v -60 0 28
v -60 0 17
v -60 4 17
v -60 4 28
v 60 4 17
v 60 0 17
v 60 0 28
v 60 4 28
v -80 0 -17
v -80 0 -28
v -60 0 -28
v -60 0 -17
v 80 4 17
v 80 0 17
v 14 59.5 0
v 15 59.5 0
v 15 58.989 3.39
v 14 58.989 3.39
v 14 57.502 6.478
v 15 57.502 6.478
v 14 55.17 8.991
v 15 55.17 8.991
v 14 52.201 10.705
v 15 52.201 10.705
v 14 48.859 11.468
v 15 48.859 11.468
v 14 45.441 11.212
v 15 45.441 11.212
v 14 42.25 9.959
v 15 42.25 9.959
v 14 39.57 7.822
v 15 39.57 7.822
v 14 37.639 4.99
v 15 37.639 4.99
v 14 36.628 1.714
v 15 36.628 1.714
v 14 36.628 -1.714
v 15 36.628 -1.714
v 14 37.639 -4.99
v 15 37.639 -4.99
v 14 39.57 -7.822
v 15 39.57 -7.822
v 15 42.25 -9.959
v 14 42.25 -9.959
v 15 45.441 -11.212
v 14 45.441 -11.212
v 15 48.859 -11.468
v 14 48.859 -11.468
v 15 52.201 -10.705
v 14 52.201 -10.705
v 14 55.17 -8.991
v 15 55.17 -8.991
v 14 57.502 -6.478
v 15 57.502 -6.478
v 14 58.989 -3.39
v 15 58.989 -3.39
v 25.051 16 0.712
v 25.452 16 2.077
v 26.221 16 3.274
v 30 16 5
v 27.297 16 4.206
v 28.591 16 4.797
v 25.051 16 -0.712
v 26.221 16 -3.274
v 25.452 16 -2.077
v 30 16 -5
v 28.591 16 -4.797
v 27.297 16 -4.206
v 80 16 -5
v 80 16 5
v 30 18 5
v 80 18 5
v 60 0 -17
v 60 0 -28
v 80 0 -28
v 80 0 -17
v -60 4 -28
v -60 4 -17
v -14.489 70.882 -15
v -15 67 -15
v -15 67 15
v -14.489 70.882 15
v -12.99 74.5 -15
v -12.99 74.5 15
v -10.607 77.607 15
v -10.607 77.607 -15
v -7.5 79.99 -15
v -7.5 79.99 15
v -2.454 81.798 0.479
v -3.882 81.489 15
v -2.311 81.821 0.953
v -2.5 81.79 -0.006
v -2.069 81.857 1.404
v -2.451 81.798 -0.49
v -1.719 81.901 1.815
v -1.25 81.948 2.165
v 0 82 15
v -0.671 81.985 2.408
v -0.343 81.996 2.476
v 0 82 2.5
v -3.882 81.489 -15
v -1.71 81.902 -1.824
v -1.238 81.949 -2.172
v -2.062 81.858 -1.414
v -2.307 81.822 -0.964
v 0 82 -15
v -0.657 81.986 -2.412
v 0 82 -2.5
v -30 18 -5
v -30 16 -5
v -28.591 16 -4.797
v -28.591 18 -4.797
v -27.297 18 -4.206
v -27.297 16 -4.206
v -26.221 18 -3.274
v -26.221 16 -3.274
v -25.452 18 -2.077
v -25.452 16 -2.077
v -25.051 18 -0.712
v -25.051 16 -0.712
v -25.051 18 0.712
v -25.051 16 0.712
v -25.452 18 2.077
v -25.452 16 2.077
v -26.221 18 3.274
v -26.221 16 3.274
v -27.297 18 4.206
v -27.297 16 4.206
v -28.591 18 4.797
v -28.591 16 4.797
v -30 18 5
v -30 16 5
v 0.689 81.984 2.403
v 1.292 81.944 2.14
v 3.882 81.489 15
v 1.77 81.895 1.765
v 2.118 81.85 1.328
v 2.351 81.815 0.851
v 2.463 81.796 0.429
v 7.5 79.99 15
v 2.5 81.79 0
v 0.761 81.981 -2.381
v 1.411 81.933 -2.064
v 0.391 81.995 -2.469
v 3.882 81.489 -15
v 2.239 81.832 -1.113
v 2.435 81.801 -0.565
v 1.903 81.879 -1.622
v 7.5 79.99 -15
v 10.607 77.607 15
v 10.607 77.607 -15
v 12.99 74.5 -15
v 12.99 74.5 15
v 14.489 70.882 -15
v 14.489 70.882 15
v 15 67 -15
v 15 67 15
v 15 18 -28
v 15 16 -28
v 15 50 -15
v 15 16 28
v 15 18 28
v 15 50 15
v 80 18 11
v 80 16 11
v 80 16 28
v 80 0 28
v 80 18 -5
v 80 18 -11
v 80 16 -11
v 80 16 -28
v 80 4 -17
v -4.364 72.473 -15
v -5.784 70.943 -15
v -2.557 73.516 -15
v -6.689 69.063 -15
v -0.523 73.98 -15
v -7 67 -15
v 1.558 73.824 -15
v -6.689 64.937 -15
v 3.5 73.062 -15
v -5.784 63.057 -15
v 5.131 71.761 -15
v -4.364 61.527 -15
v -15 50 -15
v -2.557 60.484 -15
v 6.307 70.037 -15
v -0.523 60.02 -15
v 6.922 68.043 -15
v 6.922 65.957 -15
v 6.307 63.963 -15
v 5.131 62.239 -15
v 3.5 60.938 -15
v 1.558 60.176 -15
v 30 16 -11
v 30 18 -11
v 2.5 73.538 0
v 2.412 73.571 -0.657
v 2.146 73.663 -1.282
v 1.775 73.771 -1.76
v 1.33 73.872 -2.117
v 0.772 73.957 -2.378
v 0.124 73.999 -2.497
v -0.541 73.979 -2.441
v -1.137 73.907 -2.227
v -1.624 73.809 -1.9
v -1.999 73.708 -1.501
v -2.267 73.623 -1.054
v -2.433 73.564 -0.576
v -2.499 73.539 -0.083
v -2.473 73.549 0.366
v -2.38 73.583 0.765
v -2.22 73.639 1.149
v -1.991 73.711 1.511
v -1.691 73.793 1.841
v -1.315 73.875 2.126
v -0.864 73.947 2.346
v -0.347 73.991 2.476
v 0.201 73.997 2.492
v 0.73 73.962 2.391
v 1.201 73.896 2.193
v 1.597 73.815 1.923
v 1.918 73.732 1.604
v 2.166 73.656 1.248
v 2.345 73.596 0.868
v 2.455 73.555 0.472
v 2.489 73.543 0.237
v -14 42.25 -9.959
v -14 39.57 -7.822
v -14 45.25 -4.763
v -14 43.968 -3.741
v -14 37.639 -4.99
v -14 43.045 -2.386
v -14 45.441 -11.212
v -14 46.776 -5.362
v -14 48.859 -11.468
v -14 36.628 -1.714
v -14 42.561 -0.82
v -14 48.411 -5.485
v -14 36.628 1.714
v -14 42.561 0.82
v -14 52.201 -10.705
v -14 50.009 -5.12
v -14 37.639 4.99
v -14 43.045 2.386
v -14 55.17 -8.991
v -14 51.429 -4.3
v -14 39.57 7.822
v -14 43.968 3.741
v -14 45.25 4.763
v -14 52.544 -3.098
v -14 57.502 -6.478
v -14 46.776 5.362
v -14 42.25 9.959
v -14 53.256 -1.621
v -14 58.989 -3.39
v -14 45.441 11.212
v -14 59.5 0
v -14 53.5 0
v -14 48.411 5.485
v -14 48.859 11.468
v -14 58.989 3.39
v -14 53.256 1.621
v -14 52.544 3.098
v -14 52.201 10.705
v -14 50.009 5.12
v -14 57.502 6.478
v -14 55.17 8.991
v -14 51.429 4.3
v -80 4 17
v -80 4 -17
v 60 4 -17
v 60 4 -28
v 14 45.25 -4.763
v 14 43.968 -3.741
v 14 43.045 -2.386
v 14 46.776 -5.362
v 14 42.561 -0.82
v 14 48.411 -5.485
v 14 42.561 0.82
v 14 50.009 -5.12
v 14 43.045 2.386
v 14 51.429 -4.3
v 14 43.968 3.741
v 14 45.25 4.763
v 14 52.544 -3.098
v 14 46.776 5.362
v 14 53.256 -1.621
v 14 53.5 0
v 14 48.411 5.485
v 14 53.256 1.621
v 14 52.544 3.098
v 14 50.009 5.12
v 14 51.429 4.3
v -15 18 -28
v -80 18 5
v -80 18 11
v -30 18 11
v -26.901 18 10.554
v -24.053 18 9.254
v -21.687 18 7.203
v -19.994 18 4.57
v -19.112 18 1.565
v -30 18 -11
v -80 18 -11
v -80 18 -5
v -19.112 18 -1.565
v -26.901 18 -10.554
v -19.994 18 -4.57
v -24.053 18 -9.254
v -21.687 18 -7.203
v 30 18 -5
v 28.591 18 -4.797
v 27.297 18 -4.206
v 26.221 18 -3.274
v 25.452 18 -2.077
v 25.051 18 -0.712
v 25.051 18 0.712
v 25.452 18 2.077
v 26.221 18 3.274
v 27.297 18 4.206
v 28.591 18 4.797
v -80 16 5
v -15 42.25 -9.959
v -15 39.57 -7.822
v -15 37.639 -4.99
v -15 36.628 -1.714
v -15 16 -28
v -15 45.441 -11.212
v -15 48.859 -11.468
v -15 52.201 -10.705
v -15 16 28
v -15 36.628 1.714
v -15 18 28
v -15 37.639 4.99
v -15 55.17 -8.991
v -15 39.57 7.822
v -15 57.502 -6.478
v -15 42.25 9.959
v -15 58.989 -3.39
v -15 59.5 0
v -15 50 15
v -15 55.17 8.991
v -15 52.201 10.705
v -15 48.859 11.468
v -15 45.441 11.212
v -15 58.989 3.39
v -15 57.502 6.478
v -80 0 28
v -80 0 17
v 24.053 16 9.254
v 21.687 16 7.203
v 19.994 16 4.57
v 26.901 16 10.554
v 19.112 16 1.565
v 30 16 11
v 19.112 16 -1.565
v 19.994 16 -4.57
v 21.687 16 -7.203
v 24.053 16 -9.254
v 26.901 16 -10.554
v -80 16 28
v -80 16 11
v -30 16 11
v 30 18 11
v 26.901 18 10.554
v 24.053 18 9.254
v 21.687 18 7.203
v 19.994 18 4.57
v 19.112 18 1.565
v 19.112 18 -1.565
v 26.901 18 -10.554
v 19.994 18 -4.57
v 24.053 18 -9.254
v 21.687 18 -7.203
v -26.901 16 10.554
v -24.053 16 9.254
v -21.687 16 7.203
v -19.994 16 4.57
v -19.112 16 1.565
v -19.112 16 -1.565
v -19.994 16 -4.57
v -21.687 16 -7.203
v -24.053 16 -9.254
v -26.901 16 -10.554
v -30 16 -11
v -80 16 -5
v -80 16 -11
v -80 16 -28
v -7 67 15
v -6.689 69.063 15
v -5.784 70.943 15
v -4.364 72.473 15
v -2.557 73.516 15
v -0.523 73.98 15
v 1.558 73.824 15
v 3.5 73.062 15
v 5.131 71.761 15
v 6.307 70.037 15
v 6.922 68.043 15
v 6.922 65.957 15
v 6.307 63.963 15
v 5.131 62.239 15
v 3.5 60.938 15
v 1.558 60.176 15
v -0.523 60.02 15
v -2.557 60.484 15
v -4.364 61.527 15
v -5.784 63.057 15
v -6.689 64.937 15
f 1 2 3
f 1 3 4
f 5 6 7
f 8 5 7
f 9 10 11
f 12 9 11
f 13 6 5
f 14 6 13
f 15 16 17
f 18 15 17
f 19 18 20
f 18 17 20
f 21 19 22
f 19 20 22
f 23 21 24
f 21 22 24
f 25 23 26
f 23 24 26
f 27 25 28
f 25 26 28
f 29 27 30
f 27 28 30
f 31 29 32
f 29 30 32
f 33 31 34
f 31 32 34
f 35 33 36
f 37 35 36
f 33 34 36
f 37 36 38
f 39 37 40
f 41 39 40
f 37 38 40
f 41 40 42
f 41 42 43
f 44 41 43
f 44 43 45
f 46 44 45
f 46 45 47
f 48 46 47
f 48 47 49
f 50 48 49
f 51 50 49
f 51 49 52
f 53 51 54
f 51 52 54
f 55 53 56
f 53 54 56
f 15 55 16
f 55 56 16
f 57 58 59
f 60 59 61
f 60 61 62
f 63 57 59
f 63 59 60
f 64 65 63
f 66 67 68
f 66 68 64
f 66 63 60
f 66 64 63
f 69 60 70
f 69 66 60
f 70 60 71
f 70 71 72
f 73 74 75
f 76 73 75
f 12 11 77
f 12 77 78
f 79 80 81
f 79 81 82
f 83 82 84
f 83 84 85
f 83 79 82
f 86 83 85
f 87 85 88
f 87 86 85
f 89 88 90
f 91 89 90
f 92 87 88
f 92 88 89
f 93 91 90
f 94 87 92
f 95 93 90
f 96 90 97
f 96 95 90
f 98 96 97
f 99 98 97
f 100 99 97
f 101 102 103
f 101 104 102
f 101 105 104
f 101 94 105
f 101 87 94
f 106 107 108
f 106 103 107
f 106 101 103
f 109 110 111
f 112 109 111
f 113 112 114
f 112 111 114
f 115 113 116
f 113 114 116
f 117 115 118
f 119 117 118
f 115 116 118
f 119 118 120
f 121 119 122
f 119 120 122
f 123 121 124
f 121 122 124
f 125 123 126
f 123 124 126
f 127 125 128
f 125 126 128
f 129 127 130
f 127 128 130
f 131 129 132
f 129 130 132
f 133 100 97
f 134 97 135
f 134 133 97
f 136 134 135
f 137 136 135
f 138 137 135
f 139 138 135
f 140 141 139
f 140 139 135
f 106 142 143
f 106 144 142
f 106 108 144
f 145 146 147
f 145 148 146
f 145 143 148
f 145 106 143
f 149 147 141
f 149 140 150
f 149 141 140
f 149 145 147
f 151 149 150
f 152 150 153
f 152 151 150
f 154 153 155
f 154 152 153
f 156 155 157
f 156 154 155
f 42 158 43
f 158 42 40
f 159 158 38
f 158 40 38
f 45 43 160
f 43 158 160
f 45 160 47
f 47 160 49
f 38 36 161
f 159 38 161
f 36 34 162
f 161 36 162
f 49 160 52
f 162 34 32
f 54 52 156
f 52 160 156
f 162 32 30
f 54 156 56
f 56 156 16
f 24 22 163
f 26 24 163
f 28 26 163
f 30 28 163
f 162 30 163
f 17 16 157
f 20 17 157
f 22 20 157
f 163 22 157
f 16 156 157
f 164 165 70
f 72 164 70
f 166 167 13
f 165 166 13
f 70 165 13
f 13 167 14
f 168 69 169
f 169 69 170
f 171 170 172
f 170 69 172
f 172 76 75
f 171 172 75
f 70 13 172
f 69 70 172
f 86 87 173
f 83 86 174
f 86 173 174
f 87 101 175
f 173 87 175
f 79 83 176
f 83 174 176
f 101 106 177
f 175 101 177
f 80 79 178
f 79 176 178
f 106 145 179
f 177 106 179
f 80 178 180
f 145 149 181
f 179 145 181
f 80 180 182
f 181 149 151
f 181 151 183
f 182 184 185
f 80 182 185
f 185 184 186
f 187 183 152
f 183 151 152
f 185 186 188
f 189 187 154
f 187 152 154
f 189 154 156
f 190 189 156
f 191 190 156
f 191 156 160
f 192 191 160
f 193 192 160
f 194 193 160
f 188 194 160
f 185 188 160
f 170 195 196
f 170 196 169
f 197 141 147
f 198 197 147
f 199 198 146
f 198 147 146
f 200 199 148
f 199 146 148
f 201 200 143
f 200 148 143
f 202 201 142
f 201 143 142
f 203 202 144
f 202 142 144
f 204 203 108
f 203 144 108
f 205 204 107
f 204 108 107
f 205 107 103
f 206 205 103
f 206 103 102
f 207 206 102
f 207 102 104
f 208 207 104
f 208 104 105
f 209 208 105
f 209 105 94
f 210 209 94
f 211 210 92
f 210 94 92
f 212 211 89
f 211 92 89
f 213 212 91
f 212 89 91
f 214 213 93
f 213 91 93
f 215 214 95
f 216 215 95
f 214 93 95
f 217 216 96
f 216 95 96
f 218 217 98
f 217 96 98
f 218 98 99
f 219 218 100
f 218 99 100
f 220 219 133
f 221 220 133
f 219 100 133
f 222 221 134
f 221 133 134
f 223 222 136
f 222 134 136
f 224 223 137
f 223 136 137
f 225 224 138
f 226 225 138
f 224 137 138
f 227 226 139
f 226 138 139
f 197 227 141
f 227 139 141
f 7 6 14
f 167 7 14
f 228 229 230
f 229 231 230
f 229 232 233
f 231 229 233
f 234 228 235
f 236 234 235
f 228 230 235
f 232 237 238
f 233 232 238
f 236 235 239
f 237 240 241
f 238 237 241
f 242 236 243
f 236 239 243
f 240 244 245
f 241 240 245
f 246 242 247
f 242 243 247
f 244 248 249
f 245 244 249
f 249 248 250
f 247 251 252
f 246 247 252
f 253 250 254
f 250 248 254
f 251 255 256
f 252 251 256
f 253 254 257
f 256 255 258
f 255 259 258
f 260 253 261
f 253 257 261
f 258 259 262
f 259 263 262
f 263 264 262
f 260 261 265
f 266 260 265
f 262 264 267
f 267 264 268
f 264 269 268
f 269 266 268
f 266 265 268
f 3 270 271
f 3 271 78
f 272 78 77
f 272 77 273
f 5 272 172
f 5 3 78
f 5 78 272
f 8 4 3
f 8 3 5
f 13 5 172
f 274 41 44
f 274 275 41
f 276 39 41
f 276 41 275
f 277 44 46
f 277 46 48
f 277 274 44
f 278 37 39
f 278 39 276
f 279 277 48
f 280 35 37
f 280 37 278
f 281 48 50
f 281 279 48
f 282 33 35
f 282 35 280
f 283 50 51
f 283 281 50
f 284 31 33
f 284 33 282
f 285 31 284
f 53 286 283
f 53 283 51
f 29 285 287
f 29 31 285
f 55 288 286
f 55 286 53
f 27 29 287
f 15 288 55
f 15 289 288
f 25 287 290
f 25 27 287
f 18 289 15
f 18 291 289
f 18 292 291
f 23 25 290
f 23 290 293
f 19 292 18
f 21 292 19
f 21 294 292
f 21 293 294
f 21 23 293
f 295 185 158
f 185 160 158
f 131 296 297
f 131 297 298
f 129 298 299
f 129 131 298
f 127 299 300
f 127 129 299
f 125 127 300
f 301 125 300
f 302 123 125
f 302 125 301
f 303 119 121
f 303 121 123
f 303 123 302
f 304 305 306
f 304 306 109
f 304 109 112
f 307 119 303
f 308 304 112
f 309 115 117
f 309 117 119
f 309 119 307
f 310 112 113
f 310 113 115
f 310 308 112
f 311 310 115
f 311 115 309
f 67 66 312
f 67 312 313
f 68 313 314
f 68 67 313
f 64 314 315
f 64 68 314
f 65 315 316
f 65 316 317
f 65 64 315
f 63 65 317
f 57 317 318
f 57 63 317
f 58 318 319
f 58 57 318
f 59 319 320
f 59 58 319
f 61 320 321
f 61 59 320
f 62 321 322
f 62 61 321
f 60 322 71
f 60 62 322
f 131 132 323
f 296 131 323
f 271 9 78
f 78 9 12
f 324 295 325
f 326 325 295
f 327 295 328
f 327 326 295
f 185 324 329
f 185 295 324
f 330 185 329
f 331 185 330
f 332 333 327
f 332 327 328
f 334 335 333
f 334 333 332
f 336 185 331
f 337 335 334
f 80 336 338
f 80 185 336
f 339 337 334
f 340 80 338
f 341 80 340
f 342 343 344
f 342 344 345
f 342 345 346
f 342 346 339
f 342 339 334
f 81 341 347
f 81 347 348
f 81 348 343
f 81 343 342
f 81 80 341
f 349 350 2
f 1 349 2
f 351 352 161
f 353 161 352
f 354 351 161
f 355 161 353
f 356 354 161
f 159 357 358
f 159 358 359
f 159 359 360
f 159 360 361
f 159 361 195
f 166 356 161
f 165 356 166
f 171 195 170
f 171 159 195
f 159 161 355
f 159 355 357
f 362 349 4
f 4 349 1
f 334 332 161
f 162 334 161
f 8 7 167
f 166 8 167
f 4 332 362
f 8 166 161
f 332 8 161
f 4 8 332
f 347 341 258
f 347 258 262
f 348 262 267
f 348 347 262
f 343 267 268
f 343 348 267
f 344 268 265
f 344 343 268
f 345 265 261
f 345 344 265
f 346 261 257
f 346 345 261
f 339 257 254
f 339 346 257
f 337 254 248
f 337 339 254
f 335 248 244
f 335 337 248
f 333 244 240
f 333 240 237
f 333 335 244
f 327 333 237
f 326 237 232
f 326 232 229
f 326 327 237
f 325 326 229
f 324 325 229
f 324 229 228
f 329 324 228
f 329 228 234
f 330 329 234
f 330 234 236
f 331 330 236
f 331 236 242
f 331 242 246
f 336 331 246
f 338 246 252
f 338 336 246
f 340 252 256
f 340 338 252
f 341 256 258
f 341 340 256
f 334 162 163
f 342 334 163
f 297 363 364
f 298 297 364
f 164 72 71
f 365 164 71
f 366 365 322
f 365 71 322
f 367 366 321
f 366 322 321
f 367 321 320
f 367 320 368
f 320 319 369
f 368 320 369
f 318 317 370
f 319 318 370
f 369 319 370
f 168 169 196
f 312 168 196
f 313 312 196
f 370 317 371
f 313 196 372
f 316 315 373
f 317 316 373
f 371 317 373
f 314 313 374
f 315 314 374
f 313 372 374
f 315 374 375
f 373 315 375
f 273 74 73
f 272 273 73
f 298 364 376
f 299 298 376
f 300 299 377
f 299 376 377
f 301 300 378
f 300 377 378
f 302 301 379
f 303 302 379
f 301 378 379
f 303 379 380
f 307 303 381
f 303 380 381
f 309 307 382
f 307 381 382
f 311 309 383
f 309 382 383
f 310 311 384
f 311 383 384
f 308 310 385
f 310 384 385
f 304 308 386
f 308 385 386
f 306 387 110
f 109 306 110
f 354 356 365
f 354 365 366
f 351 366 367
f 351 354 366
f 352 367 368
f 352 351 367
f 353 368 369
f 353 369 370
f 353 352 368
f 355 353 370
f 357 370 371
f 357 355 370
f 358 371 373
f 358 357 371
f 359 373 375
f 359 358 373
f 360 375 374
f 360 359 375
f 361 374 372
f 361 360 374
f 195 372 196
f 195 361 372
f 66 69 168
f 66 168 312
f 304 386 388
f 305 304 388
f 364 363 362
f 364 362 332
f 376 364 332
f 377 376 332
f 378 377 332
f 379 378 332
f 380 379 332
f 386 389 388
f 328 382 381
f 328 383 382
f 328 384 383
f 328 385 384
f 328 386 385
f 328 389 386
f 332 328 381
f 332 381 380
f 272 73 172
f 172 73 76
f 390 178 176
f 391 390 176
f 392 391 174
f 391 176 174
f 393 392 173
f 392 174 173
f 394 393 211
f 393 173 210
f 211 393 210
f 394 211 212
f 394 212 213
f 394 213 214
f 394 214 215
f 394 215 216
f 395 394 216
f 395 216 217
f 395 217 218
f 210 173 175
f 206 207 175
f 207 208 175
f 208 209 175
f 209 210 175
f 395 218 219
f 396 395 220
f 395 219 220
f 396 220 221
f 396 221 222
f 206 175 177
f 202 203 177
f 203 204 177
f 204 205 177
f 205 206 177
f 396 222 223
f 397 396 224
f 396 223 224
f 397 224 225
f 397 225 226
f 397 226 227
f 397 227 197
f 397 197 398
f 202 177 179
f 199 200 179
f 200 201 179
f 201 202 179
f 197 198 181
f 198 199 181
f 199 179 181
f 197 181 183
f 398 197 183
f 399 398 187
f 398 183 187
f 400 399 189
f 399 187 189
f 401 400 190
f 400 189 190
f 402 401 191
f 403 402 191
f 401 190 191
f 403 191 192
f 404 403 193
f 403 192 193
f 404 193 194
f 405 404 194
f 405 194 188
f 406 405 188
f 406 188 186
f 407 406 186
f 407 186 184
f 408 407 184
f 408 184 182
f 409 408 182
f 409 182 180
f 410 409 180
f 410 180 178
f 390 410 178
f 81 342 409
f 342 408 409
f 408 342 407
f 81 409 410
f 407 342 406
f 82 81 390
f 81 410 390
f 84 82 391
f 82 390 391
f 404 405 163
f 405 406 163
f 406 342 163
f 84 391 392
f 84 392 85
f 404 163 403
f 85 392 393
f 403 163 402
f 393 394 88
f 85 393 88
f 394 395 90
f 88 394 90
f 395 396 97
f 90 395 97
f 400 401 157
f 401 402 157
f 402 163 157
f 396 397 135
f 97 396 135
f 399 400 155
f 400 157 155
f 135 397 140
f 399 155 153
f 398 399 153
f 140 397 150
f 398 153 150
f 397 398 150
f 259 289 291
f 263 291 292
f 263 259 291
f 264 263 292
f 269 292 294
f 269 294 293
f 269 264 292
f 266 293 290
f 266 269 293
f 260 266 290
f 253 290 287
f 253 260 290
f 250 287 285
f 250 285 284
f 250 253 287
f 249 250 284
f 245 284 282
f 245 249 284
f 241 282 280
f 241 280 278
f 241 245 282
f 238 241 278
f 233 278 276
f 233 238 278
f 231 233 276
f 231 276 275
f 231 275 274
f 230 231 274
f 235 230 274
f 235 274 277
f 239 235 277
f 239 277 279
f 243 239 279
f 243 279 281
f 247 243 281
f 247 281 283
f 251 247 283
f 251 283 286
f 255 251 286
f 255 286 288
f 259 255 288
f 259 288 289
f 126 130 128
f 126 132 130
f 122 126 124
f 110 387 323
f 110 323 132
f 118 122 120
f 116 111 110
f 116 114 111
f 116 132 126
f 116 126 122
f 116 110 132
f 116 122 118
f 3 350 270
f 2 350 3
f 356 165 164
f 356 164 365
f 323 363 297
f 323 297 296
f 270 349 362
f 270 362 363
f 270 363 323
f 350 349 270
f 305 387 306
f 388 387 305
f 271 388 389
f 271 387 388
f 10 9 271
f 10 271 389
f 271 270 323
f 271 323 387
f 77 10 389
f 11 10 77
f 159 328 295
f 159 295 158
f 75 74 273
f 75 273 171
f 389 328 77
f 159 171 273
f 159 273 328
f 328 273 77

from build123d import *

# Parameters (mm, degrees)
SKETCH_1_W                  = 160
SKETCH_1_H                  = 56
EXTRUDE_1_DEPTH             = 16
SKETCH_2_W                  = 160
SKETCH_2_H                  = 34
CUT_EXTRUDE_1_DEPTH         = 4
SKETCH_3_W                  = 120
SKETCH_3_H                  = 56
CUT_EXTRUDE_2_DEPTH         = 4
EXTRUDE_2_DEPTH             = 2
EXTRUDE_3_DEPTH             = 15
CUT_EXTRUDE_START           = -30
CUT_EXTRUDE_3_DEPTH         = 30
HOLE_WIZARD_M16_1_D         = 14
HOLE_WIZARD_M6_1_REACH      = 119.932
HOLE_WIZARD_M6_1_BORE_R     = 2.5
HOLE_START                  = -15
HOLE_WIZARD_1_OUTLINE_R     = 5.5
HOLE_WIZARD_1_DEPTH         = 15
HOLE_WIZARD_1_2_OUTLINE_R   = 11.5
HOLE_WIZARD_1_2_OUTLINE_R_2 = 5.5
HOLE_WIZARD_1_2_DEPTH       = 1


# Read off the part's stored shape, not the designer's step: 切除-拉伸3, 孔1
with BuildPart() as part:
    # 草图1 → 凸台-拉伸1 (new body)
    with BuildSketch(Plane(origin=(0, 0, 0), x_dir=(1, 0, 0), z_dir=(0, 1, 0))):
        Rectangle(SKETCH_1_W, SKETCH_1_H)
    extrude(amount=EXTRUDE_1_DEPTH)

    # 草图2 → 切除-拉伸1 (cut)
    with BuildSketch(Plane.XZ):
        Rectangle(SKETCH_2_W, SKETCH_2_H)
    extrude(amount=-CUT_EXTRUDE_1_DEPTH, mode=Mode.SUBTRACT)

    # 草图3 → 切除-拉伸2 (cut)
    with BuildSketch(Plane.XZ):
        Rectangle(SKETCH_3_W, SKETCH_3_H)
    extrude(amount=-CUT_EXTRUDE_2_DEPTH, mode=Mode.SUBTRACT)

    # 草图4 → 凸台-拉伸2 (add)
    with BuildSketch(Plane(origin=(0, 16, 0), x_dir=(1, 0, 0), z_dir=(0, 1, 0))):
        with BuildLine():
            Line((-30, 11), (-80, 11))
            Line((-80, 11), (-80, 5))
            Line((-80, 5), (-30, 5))
            ThreePointArc((-30, 5), (-25, 0), (-30, -5))
            Line((-30, -5), (-80, -5))
            Line((-80, -5), (-80, -11))
            Line((-80, -11), (-30, -11))
            ThreePointArc((-30, -11), (-19, 0), (-30, 11))
        make_face()
    extrude_2 = extrude(amount=EXTRUDE_2_DEPTH)

    # 镜向1: 凸台-拉伸2 across plane
    add(extrude_2.mirror(Plane(origin=(0, 0, 0), x_dir=(0, 0, 1), z_dir=(1, 0, 0))))

    # 草图5 → 凸台-拉伸3 (add, symmetric)
    with BuildSketch(Plane(origin=(0, 0, 0), x_dir=(0, 0, -1), z_dir=(1, 0, 0))):
        Polygon((-28, 18), (-15, 50), (-15, 82), (15, 82), (15, 50), (28, 18), (28, 16), (-28, 16), align=None)
    extrude(amount=EXTRUDE_3_DEPTH, both=True)

    # 切除-拉伸3 outline → 切除-拉伸3 (cut)
    with BuildSketch(Plane.XY.offset(15).offset(CUT_EXTRUDE_START)):
        with BuildLine():
            Line((-15, 82), (-15, 67))
            ThreePointArc((-15, 67), (-10.606601718, 77.606601718), (0, 82))
            Line((0, 82), (-15, 82))
        make_face()
        with BuildLine():
            Line((15, 82), (0, 82))
            ThreePointArc((0, 82), (10.606601718, 77.606601718), (15, 67))
            Line((15, 67), (15, 82))
        make_face()
    extrude(amount=CUT_EXTRUDE_3_DEPTH, mode=Mode.SUBTRACT)

    # M16 螺纹孔1 (through all)
    with Locations(Plane.XY.offset(15)):
        with Locations((0, 67)):
            Hole(HOLE_WIZARD_M16_1_D / 2)

    # M6 螺纹孔1 bore → M6 螺纹孔1 (cut, up to next)
    with BuildSketch(Plane(origin=(0, 82, 0), x_dir=(1, 0, 0), z_dir=(0, 1, 0)), mode=Mode.PRIVATE) as hole_wizard_m6_1_sk1:
        Circle(HOLE_WIZARD_M6_1_BORE_R)
    hole_wizard_m6_1_tool1 = extrude(hole_wizard_m6_1_sk1.sketch, amount=-HOLE_WIZARD_M6_1_REACH, mode=Mode.PRIVATE) & part.part
    add(hole_wizard_m6_1_tool1.solids().sort_by_distance((0, 82, 0))[0], mode=Mode.SUBTRACT)

    # 孔1 outline → 孔1 (cut)
    with BuildSketch(Plane.YZ.offset(HOLE_START)):
        with Locations((48, 0)):
            Circle(HOLE_WIZARD_1_OUTLINE_R)
    hole_wizard_1 = extrude(amount=HOLE_WIZARD_1_DEPTH, mode=Mode.SUBTRACT)

    # Hole Wizard 1 2 outline → Hole Wizard 1 2 (cut)
    with BuildSketch(Plane.YZ.offset(HOLE_START)):
        with Locations((48, 0)):
            Circle(HOLE_WIZARD_1_2_OUTLINE_R)
        with Locations((48, 0)):
            Circle(HOLE_WIZARD_1_2_OUTLINE_R_2, mode=Mode.SUBTRACT)
    hole_wizard_1_2 = extrude(amount=HOLE_WIZARD_1_2_DEPTH, mode=Mode.SUBTRACT)

    # 镜向2: 孔1, Hole Wizard 1 2 across plane
    add(hole_wizard_1.mirror(Plane(origin=(0, 0, 0), x_dir=(0, 0, 1), z_dir=(1, 0, 0))), mode=Mode.SUBTRACT)
    add(hole_wizard_1_2.mirror(Plane(origin=(0, 0, 0), x_dir=(0, 0, 1), z_dir=(1, 0, 0))), mode=Mode.SUBTRACT)


solid = part.part
